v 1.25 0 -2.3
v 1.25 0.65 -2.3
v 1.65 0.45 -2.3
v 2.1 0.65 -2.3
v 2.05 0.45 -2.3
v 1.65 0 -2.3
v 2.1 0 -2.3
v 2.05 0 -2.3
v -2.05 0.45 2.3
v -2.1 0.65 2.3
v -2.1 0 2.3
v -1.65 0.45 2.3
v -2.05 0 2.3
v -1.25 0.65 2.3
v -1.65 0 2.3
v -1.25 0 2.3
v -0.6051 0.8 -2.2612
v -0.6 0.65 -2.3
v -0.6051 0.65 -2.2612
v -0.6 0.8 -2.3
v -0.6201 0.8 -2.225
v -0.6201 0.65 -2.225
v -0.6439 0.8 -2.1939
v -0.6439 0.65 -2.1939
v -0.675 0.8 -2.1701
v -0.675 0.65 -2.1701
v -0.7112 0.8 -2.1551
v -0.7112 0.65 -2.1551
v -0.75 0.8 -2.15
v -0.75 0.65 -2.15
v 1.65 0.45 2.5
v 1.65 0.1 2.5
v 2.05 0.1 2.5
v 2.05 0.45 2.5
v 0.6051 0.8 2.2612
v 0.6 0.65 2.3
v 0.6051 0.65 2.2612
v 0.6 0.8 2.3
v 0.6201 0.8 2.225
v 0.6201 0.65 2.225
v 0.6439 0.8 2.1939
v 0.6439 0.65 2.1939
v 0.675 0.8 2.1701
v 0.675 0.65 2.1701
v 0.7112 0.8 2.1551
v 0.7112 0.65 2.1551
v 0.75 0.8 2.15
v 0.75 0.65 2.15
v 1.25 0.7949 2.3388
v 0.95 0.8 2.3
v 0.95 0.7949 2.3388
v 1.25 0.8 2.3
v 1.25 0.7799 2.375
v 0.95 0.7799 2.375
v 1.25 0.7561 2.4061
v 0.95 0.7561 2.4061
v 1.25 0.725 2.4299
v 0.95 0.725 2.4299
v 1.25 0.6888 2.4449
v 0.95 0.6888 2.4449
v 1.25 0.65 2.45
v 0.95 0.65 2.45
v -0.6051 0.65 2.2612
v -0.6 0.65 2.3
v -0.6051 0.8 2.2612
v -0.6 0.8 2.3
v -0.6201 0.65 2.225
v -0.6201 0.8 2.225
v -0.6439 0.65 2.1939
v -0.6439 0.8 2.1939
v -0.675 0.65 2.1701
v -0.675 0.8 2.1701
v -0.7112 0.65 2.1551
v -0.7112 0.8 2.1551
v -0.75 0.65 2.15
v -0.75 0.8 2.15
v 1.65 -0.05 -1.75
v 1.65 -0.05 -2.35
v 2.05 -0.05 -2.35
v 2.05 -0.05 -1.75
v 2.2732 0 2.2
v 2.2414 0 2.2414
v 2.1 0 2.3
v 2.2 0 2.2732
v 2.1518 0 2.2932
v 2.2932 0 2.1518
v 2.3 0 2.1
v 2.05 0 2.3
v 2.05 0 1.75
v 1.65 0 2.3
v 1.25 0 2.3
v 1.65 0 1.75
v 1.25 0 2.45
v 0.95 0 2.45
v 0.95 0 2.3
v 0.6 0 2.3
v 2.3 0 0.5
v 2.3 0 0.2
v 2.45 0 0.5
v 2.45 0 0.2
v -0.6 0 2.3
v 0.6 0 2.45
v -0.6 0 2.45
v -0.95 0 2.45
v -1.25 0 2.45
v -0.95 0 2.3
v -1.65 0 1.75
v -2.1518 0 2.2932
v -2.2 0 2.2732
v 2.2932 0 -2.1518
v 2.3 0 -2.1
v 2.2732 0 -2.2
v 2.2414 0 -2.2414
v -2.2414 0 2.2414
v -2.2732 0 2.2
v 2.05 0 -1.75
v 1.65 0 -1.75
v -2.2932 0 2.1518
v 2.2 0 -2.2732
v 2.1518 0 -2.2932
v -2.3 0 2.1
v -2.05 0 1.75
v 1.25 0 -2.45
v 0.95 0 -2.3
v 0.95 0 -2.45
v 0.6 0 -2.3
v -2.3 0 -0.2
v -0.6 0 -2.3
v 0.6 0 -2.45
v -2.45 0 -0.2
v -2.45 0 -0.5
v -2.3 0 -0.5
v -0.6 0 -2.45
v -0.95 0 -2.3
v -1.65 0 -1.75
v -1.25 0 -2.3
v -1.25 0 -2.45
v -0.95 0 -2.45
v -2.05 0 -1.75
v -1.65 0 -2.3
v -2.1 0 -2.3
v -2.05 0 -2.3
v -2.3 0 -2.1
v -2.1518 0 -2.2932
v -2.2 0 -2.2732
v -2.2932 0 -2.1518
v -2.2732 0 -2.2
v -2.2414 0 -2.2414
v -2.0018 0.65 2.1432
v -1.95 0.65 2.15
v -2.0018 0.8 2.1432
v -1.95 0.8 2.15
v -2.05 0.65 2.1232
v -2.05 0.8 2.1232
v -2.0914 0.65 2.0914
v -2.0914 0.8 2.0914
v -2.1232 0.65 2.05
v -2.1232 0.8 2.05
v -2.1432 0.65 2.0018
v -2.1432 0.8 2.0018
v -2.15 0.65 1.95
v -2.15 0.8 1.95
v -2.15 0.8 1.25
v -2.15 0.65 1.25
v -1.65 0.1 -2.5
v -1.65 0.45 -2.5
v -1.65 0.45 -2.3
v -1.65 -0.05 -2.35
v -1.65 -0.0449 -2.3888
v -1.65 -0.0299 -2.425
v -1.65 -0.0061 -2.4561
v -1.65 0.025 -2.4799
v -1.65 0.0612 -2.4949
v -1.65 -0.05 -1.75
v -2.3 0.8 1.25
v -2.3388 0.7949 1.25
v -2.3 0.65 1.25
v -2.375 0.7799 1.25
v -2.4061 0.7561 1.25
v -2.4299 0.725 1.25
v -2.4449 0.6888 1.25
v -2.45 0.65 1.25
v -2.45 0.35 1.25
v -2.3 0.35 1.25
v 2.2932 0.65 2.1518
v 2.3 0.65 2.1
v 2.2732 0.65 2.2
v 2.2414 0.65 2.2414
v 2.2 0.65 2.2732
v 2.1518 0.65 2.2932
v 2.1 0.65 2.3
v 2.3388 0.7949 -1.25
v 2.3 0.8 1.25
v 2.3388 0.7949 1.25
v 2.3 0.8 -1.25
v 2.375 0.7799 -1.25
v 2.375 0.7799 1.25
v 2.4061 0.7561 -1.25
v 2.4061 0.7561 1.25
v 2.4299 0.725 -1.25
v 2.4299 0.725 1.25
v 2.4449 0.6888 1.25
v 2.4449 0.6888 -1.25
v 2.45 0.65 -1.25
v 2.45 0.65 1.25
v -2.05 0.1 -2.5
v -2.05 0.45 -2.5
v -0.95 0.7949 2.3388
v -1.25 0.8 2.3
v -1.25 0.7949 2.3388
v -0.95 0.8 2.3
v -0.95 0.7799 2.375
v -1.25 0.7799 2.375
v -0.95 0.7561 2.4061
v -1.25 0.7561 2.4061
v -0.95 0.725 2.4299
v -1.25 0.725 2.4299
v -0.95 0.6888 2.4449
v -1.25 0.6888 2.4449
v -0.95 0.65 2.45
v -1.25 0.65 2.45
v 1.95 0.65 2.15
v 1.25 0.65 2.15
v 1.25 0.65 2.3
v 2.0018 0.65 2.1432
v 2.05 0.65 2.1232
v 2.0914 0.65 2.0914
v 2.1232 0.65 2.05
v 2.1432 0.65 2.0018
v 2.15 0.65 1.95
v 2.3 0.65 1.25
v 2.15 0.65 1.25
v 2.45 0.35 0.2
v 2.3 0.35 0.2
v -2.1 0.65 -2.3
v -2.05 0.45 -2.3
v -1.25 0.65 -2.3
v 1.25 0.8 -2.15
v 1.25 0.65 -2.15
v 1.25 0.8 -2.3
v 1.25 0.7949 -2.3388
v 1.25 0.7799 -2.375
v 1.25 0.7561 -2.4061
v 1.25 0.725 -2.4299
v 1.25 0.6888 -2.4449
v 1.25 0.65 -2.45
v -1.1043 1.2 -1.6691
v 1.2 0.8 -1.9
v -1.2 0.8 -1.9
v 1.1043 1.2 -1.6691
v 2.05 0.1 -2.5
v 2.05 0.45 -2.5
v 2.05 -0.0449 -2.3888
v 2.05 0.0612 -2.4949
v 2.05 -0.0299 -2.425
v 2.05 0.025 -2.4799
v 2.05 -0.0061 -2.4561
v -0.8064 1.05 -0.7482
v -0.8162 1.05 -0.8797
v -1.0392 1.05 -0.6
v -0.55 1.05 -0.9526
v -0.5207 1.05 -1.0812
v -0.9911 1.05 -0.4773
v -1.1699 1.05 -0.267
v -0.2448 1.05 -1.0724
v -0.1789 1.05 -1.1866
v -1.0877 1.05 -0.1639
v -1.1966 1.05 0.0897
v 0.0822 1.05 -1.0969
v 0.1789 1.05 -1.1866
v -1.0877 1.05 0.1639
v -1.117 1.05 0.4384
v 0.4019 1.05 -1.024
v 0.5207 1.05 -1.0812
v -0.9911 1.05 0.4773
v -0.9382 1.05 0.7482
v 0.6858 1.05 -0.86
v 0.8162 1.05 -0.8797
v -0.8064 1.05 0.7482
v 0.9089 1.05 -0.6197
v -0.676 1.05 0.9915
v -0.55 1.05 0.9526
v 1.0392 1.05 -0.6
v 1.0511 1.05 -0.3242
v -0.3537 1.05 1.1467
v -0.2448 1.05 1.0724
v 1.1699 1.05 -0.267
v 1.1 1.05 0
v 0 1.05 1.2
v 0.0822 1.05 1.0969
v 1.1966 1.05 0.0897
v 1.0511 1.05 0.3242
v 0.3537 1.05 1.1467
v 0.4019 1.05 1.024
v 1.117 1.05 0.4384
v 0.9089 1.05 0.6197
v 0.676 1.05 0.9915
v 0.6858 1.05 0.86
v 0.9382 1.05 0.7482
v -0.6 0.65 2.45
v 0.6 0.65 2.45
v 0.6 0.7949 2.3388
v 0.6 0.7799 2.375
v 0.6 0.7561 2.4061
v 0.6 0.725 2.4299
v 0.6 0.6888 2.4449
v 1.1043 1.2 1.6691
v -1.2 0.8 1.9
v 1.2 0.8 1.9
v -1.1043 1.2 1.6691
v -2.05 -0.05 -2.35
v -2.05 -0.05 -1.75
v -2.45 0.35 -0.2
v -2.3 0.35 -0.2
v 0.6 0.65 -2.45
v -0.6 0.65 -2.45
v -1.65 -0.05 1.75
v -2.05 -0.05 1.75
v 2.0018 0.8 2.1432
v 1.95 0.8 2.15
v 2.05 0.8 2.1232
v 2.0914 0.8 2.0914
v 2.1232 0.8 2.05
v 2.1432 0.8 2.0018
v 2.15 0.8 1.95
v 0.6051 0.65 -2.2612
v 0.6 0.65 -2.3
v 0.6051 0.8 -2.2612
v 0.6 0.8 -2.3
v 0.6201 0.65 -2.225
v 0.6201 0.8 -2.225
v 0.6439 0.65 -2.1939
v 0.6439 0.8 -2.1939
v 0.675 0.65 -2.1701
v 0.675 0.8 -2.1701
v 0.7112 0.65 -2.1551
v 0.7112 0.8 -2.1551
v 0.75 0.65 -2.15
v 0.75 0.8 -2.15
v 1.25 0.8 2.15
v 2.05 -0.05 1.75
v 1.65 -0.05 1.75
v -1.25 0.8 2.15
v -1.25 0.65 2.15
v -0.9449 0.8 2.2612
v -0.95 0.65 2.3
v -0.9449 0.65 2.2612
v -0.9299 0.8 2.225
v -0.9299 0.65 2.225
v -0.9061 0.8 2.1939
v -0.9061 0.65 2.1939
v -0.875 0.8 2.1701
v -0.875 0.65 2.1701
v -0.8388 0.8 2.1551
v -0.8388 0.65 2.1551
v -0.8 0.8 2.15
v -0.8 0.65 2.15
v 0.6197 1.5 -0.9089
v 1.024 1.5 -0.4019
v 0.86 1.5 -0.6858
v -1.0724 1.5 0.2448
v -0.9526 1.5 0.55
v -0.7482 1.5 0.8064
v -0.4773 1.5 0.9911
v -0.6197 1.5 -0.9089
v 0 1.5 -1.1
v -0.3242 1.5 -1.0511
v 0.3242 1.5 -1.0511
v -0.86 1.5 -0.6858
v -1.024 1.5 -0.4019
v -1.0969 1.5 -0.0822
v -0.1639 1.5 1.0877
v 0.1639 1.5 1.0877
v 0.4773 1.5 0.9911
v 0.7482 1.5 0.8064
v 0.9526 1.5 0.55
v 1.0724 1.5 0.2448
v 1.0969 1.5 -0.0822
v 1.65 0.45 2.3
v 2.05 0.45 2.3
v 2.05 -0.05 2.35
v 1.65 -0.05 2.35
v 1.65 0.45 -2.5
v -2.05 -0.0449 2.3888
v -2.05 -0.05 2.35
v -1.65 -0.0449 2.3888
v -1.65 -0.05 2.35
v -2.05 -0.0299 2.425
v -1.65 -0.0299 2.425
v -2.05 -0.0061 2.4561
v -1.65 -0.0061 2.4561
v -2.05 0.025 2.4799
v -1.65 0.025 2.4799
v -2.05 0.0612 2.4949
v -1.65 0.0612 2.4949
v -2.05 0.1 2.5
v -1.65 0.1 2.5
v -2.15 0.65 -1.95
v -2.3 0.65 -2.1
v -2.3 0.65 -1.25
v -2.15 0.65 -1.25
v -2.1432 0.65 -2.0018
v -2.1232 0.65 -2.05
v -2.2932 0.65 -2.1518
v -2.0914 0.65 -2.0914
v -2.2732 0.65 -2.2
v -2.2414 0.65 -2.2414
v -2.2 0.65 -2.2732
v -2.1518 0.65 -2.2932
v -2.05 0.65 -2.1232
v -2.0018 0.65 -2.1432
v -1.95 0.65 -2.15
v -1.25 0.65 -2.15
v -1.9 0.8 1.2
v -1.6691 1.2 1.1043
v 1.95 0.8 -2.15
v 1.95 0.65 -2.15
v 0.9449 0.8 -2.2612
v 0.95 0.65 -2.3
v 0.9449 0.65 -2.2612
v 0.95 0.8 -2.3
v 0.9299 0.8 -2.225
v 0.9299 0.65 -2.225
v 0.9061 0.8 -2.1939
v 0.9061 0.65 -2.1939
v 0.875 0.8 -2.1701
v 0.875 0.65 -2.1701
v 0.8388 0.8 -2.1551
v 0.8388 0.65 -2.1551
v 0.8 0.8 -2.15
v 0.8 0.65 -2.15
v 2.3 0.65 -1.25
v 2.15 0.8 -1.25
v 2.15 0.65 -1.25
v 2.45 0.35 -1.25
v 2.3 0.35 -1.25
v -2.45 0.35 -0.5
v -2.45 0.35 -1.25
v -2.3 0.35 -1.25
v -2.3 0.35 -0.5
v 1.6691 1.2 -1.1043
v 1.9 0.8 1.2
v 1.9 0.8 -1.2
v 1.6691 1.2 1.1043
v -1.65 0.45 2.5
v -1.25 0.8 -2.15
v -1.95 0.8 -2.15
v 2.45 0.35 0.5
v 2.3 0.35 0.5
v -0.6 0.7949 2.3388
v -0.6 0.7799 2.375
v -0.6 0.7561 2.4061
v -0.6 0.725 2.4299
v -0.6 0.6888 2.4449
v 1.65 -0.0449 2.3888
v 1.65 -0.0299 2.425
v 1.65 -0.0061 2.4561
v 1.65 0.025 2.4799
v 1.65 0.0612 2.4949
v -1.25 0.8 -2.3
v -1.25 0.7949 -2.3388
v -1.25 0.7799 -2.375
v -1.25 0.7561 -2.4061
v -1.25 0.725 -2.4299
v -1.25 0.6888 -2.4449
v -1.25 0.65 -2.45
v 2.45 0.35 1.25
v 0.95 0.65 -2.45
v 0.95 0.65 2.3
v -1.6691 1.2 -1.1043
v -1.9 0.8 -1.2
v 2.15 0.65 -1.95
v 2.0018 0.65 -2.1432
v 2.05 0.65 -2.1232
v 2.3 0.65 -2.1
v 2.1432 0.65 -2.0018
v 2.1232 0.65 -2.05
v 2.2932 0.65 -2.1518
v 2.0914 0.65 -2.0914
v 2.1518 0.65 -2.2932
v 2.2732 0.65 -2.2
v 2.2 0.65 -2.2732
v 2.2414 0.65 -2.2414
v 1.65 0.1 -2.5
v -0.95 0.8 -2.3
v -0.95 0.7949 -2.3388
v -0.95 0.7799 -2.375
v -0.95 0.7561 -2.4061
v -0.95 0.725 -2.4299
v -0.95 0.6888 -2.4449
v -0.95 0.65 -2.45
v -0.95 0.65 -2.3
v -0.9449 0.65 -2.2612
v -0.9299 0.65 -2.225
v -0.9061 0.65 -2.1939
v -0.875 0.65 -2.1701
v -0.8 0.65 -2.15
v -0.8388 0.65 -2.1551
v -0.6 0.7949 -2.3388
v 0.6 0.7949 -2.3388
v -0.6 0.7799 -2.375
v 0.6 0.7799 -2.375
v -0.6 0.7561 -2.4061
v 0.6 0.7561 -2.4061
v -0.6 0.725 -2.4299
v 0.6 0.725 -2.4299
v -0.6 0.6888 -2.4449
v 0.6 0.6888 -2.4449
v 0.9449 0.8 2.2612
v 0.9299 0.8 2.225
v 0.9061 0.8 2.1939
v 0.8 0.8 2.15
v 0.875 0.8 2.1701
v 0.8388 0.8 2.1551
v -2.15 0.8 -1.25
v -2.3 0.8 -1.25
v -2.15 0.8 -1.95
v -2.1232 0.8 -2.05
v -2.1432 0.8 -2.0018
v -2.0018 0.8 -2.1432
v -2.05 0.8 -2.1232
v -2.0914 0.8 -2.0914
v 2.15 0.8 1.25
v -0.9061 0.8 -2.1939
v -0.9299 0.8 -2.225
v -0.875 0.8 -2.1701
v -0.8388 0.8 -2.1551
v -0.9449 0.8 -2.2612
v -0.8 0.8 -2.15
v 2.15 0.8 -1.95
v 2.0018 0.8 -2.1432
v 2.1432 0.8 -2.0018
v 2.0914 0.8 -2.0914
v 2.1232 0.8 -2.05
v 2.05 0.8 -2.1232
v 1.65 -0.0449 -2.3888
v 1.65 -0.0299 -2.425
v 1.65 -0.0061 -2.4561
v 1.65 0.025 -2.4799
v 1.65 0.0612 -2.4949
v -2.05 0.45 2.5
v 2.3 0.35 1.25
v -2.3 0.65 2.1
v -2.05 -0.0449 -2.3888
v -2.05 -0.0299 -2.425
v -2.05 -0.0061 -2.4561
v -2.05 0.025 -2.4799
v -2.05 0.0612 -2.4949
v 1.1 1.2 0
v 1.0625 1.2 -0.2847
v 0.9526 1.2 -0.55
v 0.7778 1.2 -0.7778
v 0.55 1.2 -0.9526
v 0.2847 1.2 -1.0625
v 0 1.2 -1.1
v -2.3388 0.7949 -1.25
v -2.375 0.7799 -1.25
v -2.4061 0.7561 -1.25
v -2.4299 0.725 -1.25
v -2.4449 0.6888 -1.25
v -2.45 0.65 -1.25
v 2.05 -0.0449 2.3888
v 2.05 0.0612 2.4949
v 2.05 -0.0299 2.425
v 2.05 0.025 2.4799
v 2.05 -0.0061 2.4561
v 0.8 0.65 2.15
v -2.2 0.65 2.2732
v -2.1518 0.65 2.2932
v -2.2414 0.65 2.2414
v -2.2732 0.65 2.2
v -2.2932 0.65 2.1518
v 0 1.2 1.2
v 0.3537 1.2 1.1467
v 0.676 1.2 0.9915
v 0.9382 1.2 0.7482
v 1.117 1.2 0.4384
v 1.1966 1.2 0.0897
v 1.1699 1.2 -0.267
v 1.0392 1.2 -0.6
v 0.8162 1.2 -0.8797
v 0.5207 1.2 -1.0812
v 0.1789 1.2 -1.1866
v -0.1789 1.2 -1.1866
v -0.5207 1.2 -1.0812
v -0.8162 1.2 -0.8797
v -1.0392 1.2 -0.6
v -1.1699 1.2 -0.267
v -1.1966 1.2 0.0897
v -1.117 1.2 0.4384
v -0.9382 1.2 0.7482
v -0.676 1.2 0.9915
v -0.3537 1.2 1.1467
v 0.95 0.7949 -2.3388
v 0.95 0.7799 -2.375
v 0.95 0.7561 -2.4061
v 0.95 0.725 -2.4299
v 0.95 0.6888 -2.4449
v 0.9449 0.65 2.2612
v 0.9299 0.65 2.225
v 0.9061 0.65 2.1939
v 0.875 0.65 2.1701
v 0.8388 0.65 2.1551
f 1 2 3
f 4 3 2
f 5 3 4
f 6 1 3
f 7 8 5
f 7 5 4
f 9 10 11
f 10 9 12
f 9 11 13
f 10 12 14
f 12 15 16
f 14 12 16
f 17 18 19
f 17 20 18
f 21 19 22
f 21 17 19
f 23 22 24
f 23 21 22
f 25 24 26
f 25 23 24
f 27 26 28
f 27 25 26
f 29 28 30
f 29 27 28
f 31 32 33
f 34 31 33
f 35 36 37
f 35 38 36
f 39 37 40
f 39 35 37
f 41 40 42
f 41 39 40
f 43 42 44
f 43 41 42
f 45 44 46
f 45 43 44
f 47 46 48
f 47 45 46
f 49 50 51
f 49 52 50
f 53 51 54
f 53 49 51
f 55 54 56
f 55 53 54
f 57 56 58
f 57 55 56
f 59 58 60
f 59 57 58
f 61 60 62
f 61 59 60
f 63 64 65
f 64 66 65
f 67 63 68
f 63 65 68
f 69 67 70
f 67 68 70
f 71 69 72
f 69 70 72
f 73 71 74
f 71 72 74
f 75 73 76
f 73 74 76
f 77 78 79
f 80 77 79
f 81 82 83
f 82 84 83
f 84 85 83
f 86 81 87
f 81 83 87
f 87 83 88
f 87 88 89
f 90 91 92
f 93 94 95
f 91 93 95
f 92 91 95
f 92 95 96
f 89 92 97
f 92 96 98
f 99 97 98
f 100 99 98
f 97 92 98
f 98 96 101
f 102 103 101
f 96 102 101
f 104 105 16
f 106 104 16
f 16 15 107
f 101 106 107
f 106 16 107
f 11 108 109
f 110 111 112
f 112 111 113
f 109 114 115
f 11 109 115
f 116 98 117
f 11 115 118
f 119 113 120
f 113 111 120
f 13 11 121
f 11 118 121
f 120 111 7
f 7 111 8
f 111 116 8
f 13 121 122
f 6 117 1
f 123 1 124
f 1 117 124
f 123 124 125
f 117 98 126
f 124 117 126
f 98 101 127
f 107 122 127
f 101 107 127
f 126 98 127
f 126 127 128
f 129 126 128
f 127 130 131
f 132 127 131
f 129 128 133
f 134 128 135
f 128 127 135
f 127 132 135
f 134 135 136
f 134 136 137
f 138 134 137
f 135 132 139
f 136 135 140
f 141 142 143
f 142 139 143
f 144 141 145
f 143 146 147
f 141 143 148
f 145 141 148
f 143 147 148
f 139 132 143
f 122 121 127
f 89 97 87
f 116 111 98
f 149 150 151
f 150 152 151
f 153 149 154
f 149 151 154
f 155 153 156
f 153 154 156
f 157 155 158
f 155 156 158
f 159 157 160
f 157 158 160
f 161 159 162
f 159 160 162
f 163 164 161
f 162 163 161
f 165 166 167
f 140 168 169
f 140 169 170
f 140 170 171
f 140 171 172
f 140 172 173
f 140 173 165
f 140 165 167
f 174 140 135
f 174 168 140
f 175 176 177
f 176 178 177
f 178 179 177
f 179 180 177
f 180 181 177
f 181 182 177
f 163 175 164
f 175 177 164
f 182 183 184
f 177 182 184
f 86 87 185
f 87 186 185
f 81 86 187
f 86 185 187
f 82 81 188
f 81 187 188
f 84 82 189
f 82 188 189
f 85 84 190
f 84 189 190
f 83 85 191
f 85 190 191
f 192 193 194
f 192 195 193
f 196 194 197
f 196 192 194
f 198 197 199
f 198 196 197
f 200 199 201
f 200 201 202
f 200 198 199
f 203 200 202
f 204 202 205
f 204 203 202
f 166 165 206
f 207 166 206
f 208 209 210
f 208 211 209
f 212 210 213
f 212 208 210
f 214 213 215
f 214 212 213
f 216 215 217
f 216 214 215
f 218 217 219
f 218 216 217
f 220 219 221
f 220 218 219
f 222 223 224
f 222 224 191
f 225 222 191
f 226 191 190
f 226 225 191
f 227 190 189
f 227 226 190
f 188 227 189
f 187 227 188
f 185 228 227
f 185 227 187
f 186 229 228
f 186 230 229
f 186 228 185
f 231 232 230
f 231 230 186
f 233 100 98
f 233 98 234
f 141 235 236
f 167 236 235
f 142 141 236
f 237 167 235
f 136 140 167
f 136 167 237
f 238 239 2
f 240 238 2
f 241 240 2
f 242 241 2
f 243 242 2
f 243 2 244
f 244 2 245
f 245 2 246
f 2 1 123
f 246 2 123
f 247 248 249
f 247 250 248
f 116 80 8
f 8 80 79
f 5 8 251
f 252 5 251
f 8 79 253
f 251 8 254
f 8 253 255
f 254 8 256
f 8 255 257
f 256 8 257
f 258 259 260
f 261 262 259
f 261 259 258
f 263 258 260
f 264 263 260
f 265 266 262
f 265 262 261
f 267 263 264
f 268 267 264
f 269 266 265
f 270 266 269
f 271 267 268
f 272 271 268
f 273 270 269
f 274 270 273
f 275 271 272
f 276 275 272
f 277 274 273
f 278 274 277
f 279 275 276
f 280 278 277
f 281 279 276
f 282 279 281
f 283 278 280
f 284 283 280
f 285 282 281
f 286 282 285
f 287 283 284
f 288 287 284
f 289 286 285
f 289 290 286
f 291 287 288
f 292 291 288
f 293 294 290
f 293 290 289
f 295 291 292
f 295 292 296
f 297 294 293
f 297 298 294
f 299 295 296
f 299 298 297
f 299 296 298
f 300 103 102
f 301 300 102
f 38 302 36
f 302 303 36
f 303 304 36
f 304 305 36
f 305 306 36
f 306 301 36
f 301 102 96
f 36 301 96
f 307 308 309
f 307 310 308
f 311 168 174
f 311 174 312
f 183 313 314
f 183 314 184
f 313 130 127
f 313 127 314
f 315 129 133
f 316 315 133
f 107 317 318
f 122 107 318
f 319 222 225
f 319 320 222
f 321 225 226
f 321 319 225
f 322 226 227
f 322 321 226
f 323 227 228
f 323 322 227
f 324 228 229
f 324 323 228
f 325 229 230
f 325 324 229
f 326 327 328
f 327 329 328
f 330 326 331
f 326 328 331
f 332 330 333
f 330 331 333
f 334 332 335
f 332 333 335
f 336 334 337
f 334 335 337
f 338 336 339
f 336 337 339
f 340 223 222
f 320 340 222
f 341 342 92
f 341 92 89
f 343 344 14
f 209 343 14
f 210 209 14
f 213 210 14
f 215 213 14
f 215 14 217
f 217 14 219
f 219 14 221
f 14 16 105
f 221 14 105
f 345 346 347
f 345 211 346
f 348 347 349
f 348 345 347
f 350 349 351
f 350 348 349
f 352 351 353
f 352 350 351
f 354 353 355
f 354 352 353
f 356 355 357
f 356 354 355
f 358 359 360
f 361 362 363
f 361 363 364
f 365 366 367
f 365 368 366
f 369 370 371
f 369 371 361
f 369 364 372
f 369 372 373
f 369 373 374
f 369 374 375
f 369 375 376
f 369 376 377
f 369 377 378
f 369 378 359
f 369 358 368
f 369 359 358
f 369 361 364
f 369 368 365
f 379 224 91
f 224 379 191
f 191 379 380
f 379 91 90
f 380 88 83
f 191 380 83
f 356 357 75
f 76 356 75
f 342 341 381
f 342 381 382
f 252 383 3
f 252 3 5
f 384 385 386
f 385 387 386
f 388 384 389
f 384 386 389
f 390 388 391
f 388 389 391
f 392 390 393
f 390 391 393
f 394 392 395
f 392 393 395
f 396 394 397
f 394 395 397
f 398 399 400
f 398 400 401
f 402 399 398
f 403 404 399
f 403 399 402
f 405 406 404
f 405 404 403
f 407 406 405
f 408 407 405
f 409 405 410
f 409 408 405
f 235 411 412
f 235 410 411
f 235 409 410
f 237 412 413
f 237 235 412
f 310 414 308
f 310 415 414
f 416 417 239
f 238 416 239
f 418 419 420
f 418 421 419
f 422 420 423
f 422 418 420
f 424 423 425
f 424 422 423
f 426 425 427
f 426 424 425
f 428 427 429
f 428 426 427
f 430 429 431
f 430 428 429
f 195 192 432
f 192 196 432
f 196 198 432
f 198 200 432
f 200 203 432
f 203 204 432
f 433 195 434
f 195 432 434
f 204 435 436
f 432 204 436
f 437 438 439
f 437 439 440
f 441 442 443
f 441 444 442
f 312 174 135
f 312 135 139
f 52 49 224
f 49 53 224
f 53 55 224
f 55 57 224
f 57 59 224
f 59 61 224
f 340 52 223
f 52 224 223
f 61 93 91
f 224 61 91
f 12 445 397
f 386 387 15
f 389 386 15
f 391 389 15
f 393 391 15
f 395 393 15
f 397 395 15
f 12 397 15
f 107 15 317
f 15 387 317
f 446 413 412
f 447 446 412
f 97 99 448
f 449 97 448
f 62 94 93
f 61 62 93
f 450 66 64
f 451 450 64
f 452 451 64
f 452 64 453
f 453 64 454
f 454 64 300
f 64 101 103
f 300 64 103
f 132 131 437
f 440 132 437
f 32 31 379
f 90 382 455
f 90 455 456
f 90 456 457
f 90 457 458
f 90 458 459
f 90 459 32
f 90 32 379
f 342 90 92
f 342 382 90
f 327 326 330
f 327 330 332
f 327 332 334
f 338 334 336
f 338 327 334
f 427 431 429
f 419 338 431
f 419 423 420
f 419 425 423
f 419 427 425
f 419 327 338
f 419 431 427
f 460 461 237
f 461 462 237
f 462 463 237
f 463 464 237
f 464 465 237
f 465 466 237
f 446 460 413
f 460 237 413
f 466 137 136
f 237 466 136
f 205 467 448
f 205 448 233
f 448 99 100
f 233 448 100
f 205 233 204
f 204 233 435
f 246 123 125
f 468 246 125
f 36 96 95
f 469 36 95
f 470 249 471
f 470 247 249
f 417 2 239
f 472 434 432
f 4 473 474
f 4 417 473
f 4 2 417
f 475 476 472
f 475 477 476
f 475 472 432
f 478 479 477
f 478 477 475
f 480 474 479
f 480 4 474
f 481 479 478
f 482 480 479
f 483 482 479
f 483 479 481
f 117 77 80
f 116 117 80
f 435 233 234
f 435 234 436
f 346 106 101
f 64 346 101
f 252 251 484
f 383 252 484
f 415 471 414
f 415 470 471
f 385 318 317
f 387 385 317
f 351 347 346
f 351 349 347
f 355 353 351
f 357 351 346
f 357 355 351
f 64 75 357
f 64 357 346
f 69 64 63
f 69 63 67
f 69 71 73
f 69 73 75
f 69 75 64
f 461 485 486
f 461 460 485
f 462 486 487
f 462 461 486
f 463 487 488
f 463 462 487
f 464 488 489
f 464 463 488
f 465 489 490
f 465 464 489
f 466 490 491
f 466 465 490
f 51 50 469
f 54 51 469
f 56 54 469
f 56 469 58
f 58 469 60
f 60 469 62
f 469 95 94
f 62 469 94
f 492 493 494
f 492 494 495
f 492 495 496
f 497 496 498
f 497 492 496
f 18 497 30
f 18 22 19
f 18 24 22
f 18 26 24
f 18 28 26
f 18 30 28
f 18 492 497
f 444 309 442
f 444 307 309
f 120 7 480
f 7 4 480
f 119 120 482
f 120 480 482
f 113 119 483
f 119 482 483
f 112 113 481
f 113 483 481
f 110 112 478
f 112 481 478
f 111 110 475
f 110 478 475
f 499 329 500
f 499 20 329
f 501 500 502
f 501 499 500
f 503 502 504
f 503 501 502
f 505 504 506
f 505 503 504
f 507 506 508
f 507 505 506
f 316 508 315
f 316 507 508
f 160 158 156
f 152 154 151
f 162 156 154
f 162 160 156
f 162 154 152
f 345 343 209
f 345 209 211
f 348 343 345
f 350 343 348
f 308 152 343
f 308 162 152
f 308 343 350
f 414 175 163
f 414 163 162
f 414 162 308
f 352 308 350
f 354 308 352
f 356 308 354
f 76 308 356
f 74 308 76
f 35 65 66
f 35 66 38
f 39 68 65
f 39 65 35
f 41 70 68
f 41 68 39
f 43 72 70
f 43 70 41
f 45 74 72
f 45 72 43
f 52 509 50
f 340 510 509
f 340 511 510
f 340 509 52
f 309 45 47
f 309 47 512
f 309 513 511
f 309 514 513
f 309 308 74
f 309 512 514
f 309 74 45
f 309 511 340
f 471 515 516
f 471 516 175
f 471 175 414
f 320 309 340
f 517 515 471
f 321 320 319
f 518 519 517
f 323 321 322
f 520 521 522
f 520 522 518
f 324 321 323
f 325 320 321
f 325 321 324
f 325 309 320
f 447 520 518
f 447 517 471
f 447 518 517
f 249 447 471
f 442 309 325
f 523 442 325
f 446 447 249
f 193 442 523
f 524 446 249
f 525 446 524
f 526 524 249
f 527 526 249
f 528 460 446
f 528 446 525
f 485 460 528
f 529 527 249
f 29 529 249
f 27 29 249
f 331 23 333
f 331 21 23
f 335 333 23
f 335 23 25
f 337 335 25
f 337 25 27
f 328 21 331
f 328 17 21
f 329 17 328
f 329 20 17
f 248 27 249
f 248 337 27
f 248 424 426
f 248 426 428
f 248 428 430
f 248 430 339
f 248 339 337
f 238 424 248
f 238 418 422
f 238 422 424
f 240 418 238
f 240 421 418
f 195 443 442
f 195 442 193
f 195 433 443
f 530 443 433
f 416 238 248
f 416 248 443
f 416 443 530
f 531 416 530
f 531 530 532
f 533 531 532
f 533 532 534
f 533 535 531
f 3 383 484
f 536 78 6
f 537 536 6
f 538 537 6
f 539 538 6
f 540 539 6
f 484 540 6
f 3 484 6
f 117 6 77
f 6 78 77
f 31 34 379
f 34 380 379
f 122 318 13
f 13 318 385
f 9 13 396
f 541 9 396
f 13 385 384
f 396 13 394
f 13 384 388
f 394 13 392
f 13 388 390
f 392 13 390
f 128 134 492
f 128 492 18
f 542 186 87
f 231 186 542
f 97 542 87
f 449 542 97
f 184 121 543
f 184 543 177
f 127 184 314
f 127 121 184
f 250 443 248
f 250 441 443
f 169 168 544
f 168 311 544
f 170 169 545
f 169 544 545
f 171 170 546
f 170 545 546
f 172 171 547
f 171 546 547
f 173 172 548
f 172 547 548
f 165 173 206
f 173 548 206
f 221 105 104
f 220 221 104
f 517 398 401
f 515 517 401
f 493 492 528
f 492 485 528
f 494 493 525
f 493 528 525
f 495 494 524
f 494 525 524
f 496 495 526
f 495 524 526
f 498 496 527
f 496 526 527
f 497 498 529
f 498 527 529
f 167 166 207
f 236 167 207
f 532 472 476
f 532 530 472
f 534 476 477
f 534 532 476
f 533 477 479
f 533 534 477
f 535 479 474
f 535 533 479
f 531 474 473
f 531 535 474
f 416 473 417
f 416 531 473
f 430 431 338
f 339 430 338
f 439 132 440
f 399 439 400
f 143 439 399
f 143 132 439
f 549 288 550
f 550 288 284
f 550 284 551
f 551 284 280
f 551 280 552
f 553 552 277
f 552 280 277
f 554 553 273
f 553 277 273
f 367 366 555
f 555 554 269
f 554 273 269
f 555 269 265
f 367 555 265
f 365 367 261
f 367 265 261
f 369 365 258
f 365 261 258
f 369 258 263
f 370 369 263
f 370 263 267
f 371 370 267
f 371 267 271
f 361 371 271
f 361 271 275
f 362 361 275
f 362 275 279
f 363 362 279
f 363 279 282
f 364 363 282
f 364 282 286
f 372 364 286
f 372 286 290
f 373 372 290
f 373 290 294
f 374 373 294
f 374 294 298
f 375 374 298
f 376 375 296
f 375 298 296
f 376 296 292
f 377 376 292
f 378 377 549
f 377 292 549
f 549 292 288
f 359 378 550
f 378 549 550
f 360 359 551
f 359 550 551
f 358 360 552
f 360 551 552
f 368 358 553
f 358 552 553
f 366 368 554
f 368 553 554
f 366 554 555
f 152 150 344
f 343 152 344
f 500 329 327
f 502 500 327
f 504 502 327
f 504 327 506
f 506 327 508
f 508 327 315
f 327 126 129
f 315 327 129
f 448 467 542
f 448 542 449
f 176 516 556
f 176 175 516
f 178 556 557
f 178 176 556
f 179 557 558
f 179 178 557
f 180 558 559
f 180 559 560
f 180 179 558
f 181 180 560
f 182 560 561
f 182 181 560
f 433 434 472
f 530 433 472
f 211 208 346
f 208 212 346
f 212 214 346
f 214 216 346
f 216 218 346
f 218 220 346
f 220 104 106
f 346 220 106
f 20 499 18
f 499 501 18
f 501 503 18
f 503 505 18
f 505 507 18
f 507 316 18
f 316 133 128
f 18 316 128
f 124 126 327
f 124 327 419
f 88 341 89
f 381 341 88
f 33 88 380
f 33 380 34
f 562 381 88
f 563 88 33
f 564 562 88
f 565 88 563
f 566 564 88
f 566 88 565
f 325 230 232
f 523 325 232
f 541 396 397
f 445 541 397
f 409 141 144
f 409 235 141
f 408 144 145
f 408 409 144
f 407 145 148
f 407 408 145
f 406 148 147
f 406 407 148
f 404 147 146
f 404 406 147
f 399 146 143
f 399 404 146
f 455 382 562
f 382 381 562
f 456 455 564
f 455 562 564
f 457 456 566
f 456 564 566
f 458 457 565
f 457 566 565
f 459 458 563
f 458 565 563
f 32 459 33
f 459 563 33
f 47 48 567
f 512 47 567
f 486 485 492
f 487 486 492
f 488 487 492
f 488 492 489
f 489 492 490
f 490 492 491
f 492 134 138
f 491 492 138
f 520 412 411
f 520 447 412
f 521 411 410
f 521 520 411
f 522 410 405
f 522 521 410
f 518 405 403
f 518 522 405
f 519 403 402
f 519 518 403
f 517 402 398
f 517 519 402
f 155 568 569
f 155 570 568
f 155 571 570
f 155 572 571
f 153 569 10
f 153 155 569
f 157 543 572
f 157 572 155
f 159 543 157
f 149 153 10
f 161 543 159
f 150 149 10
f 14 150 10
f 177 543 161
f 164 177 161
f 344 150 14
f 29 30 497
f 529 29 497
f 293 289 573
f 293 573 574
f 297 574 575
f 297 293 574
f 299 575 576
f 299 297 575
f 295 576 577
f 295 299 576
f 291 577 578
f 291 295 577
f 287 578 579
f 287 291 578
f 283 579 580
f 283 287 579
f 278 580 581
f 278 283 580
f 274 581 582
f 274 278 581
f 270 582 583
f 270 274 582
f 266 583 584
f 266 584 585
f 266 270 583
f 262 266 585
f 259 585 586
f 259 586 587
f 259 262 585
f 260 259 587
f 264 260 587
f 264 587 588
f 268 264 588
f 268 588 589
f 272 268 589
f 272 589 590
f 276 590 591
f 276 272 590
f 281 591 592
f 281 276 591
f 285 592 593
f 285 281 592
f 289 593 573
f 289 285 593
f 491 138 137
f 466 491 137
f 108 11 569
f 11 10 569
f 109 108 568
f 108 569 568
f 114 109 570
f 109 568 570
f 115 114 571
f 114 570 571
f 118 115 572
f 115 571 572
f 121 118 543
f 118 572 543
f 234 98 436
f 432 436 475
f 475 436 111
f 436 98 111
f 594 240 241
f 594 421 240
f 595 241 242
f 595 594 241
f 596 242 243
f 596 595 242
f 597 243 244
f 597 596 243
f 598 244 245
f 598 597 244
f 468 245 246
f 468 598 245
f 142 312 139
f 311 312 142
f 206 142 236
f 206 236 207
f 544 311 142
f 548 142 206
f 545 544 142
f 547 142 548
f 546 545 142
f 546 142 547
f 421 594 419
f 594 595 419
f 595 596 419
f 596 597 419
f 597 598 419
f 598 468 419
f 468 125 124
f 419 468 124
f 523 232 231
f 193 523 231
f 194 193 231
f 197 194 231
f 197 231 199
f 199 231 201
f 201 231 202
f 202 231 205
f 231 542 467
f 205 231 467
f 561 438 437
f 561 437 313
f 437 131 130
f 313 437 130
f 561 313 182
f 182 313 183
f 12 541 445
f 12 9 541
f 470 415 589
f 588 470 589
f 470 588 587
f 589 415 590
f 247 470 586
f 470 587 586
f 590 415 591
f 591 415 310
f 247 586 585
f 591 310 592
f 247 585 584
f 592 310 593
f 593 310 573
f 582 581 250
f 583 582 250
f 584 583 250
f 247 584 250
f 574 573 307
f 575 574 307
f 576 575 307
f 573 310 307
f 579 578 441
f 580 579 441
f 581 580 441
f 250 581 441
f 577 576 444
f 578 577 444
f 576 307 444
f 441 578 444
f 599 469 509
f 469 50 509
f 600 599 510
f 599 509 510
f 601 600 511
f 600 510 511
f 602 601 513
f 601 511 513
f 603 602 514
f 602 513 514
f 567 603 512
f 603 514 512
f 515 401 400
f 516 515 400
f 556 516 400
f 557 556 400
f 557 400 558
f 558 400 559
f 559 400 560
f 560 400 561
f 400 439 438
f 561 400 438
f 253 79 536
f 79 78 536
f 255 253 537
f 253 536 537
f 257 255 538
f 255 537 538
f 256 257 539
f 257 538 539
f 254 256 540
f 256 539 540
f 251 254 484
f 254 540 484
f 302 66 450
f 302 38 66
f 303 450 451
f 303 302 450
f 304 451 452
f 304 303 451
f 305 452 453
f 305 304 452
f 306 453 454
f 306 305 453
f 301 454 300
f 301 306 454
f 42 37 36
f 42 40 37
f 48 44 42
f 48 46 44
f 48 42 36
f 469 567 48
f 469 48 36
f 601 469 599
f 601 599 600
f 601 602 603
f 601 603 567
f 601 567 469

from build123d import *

# Parameters (mm, degrees)
SKETCH1_W           = 4.6
SKETCH1_H           = 4.6
EXTRUDE1_DEPTH      = 0.65
EXTRUDE2_DEPTH      = 0.8
EXTRUDE3_DEPTH      = 0.4
EXTRUDE3_TAPER      = 30
SKETCH1_4_R         = 1.1
EXTRUDE4_DEPTH      = 1.5
CUT_EXTRUDE1_START  = -0.15
SKETCH3_R           = 1.2
SKETCH3_R_2         = 1.1
CUT_EXTRUDE1_DEPTH  = 0.15
SKETCH4_W           = 0.75
SKETCH4_H           = 0.35
SKETCH4_W_2         = 1.45
CUT_EXTRUDE2_DEPTH  = 0.15
SKETCH5_W           = 0.75
SKETCH5_H           = 0.35
SKETCH5_W_2         = 1.45
CUT_EXTRUDE3_DEPTH  = 0.15
EXTRUDE5_DEPTH      = 0.45
EXTRUDE5_DEPTH_BACK = 0.05
FILLET1_R           = 0.2
FILLET2_R           = 0.15
FILLET3_R           = 0.15


with BuildPart() as part:
    # Sketch1 → Extrude1 (new body)
    with BuildSketch(Plane(origin=(0, 0, 0), x_dir=(1, 0, 0), z_dir=(0, 1, 0))):
        Rectangle(SKETCH1_W, SKETCH1_H)
    extrude(amount=EXTRUDE1_DEPTH)

    # Sketch1<3> → Extrude2 (add)
    with BuildSketch(Plane(origin=(0, 0, 0), x_dir=(1, 0, 0), z_dir=(0, 1, 0))):
        Polygon((-2.45, 1.25), (-2.45, -1.25), (-2.15, -1.25), (-2.15, -2.15), (-1.25, -2.15), (-1.25, -2.45), (-0.95, -2.45), (-0.95, -2.15), (-0.6, -2.15), (-0.6, -2.45), (0.6, -2.45), (0.6, -2.15), (0.95, -2.15), (0.95, -2.45), (1.25, -2.45), (1.25, -2.15), (2.15, -2.15), (2.15, -1.25), (2.45, -1.25), (2.45, 1.25), (2.15, 1.25), (2.15, 2.15), (1.25, 2.15), (1.25, 2.45), (0.95, 2.45), (0.95, 2.15), (0.6, 2.15), (0.6, 2.45), (-0.6, 2.45), (-0.6, 2.15), (-0.95, 2.15), (-0.95, 2.45), (-1.25, 2.45), (-1.25, 2.15), (-2.15, 2.15), (-2.15, 1.25), align=None)
    extrude(amount=EXTRUDE2_DEPTH)

    # Sketch2 → Extrude3 (add)
    with BuildSketch(Plane(origin=(0, 0.8, 0), x_dir=(-1, 0, 0), z_dir=(0, 1, 0))):
        Polygon((1.9, 1.2), (1.2, 1.9), (-1.2, 1.9), (-1.9, 1.2), (-1.9, -1.2), (-1.2, -1.9), (1.2, -1.9), (1.9, -1.2), align=None)
    extrude(amount=EXTRUDE3_DEPTH, taper=EXTRUDE3_TAPER)

    # Sketch1<4> → Extrude4 (add)
    with BuildSketch(Plane(origin=(0, 0, 0), x_dir=(1, 0, 0), z_dir=(0, 1, 0))):
        Circle(SKETCH1_4_R)
    extrude(amount=EXTRUDE4_DEPTH)

    # Sketch3 → Cut-Extrude1 (cut)
    with BuildSketch(Plane(origin=(0, 1.2, 0), x_dir=(-1, 0, 0), z_dir=(0, 1, 0)).offset(CUT_EXTRUDE1_START)):
        Circle(SKETCH3_R)
        Circle(SKETCH3_R_2, mode=Mode.SUBTRACT)
    extrude(amount=CUT_EXTRUDE1_DEPTH, mode=Mode.SUBTRACT)

    # Sketch4 → Cut-Extrude2 (cut)
    with BuildSketch(Plane(origin=(2.45, 0, 0), x_dir=(0, 0, -1), z_dir=(1, 0, 0))):
        with Locations((-0.875, 0.175)):
            Rectangle(SKETCH4_W, SKETCH4_H)
        with Locations((0.525, 0.175)):
            Rectangle(SKETCH4_W_2, SKETCH4_H)
    extrude(amount=-CUT_EXTRUDE2_DEPTH, mode=Mode.SUBTRACT)

    # Sketch5 → Cut-Extrude3 (cut)
    with BuildSketch(Plane.ZY.offset(2.45)):
        with Locations((-0.875, 0.175)):
            Rectangle(SKETCH5_W, SKETCH5_H)
        with Locations((0.525, 0.175)):
            Rectangle(SKETCH5_W_2, SKETCH5_H)
    extrude(amount=-CUT_EXTRUDE3_DEPTH, mode=Mode.SUBTRACT)

    # Sketch6 → Extrude5 (add, two sides: drawn at the far end of the back side and taken through both)
    with BuildSketch(Plane(origin=(0, 0, 0), x_dir=(1, 0, 0), z_dir=(0, 1, 0)).offset(-EXTRUDE5_DEPTH_BACK)):
        Polygon((2.05, 2.5), (1.85, 2.5), (1.65, 2.5), (1.65, 1.75), (2.05, 1.75), align=None)
        Polygon((-2.05, 2.5), (-1.85, 2.5), (-1.65, 2.5), (-1.65, 1.75), (-2.05, 1.75), align=None)
        Polygon((2.05, -2.5), (1.85, -2.5), (1.65, -2.5), (1.65, -1.75), (2.05, -1.75), align=None)
        Polygon((-1.85, -2.5), (-1.65, -2.5), (-1.65, -1.75), (-2.05, -1.75), (-2.05, -2.5), align=None)
    extrude(amount=EXTRUDE5_DEPTH + EXTRUDE5_DEPTH_BACK)

    # Fillet1
    fillet1_edges = [part.edges().sort_by_distance(p)[0] for p in [
        (-2.15, 0.725, -2.15),
        (-2.3, 0.325, -2.3),
        (2.15, 0.725, -2.15),
        (2.3, 0.325, -2.3),
        (2.15, 0.725, 2.15),
        (2.3, 0.325, 2.3),
        (-2.15, 0.725, 2.15),
        (-2.3, 0.325, 2.3),
    ]]
    fillet(fillet1_edges, radius=FILLET1_R)

    # Fillet2
    fillet2_edges = [part.edges().sort_by_distance(p)[0] for p in [
        (0.95, 0.725, 2.15),
        (0.6, 0.725, 2.15),
        (-0.6, 0.725, 2.15),
        (-0.95, 0.725, 2.15),
        (-0.95, 0.725, -2.15),
        (-0.6, 0.725, -2.15),
        (0.6, 0.725, -2.15),
        (0.95, 0.725, -2.15),
    ]]
    fillet(fillet2_edges, radius=FILLET2_R)

    # Fillet3
    fillet3_edges = [part.edges().sort_by_distance(p)[0] for p in [
        (1.85, -0.05, 2.5),
        (-1.85, -0.05, 2.5),
        (1.85, -0.05, -2.5),
        (-1.85, -0.05, -2.5),
        (-2.45, 0.8, 0),
        (-1.1, 0.8, -2.45),
        (0, 0.8, -2.45),
        (1.1, 0.8, -2.45),
        (2.45, 0.8, 0),
        (1.1, 0.8, 2.45),
        (-1.1, 0.8, 2.45),
        (0, 0.8, 2.45),
    ]]
    fillet(fillet3_edges, radius=FILLET3_R)


solid = part.part
